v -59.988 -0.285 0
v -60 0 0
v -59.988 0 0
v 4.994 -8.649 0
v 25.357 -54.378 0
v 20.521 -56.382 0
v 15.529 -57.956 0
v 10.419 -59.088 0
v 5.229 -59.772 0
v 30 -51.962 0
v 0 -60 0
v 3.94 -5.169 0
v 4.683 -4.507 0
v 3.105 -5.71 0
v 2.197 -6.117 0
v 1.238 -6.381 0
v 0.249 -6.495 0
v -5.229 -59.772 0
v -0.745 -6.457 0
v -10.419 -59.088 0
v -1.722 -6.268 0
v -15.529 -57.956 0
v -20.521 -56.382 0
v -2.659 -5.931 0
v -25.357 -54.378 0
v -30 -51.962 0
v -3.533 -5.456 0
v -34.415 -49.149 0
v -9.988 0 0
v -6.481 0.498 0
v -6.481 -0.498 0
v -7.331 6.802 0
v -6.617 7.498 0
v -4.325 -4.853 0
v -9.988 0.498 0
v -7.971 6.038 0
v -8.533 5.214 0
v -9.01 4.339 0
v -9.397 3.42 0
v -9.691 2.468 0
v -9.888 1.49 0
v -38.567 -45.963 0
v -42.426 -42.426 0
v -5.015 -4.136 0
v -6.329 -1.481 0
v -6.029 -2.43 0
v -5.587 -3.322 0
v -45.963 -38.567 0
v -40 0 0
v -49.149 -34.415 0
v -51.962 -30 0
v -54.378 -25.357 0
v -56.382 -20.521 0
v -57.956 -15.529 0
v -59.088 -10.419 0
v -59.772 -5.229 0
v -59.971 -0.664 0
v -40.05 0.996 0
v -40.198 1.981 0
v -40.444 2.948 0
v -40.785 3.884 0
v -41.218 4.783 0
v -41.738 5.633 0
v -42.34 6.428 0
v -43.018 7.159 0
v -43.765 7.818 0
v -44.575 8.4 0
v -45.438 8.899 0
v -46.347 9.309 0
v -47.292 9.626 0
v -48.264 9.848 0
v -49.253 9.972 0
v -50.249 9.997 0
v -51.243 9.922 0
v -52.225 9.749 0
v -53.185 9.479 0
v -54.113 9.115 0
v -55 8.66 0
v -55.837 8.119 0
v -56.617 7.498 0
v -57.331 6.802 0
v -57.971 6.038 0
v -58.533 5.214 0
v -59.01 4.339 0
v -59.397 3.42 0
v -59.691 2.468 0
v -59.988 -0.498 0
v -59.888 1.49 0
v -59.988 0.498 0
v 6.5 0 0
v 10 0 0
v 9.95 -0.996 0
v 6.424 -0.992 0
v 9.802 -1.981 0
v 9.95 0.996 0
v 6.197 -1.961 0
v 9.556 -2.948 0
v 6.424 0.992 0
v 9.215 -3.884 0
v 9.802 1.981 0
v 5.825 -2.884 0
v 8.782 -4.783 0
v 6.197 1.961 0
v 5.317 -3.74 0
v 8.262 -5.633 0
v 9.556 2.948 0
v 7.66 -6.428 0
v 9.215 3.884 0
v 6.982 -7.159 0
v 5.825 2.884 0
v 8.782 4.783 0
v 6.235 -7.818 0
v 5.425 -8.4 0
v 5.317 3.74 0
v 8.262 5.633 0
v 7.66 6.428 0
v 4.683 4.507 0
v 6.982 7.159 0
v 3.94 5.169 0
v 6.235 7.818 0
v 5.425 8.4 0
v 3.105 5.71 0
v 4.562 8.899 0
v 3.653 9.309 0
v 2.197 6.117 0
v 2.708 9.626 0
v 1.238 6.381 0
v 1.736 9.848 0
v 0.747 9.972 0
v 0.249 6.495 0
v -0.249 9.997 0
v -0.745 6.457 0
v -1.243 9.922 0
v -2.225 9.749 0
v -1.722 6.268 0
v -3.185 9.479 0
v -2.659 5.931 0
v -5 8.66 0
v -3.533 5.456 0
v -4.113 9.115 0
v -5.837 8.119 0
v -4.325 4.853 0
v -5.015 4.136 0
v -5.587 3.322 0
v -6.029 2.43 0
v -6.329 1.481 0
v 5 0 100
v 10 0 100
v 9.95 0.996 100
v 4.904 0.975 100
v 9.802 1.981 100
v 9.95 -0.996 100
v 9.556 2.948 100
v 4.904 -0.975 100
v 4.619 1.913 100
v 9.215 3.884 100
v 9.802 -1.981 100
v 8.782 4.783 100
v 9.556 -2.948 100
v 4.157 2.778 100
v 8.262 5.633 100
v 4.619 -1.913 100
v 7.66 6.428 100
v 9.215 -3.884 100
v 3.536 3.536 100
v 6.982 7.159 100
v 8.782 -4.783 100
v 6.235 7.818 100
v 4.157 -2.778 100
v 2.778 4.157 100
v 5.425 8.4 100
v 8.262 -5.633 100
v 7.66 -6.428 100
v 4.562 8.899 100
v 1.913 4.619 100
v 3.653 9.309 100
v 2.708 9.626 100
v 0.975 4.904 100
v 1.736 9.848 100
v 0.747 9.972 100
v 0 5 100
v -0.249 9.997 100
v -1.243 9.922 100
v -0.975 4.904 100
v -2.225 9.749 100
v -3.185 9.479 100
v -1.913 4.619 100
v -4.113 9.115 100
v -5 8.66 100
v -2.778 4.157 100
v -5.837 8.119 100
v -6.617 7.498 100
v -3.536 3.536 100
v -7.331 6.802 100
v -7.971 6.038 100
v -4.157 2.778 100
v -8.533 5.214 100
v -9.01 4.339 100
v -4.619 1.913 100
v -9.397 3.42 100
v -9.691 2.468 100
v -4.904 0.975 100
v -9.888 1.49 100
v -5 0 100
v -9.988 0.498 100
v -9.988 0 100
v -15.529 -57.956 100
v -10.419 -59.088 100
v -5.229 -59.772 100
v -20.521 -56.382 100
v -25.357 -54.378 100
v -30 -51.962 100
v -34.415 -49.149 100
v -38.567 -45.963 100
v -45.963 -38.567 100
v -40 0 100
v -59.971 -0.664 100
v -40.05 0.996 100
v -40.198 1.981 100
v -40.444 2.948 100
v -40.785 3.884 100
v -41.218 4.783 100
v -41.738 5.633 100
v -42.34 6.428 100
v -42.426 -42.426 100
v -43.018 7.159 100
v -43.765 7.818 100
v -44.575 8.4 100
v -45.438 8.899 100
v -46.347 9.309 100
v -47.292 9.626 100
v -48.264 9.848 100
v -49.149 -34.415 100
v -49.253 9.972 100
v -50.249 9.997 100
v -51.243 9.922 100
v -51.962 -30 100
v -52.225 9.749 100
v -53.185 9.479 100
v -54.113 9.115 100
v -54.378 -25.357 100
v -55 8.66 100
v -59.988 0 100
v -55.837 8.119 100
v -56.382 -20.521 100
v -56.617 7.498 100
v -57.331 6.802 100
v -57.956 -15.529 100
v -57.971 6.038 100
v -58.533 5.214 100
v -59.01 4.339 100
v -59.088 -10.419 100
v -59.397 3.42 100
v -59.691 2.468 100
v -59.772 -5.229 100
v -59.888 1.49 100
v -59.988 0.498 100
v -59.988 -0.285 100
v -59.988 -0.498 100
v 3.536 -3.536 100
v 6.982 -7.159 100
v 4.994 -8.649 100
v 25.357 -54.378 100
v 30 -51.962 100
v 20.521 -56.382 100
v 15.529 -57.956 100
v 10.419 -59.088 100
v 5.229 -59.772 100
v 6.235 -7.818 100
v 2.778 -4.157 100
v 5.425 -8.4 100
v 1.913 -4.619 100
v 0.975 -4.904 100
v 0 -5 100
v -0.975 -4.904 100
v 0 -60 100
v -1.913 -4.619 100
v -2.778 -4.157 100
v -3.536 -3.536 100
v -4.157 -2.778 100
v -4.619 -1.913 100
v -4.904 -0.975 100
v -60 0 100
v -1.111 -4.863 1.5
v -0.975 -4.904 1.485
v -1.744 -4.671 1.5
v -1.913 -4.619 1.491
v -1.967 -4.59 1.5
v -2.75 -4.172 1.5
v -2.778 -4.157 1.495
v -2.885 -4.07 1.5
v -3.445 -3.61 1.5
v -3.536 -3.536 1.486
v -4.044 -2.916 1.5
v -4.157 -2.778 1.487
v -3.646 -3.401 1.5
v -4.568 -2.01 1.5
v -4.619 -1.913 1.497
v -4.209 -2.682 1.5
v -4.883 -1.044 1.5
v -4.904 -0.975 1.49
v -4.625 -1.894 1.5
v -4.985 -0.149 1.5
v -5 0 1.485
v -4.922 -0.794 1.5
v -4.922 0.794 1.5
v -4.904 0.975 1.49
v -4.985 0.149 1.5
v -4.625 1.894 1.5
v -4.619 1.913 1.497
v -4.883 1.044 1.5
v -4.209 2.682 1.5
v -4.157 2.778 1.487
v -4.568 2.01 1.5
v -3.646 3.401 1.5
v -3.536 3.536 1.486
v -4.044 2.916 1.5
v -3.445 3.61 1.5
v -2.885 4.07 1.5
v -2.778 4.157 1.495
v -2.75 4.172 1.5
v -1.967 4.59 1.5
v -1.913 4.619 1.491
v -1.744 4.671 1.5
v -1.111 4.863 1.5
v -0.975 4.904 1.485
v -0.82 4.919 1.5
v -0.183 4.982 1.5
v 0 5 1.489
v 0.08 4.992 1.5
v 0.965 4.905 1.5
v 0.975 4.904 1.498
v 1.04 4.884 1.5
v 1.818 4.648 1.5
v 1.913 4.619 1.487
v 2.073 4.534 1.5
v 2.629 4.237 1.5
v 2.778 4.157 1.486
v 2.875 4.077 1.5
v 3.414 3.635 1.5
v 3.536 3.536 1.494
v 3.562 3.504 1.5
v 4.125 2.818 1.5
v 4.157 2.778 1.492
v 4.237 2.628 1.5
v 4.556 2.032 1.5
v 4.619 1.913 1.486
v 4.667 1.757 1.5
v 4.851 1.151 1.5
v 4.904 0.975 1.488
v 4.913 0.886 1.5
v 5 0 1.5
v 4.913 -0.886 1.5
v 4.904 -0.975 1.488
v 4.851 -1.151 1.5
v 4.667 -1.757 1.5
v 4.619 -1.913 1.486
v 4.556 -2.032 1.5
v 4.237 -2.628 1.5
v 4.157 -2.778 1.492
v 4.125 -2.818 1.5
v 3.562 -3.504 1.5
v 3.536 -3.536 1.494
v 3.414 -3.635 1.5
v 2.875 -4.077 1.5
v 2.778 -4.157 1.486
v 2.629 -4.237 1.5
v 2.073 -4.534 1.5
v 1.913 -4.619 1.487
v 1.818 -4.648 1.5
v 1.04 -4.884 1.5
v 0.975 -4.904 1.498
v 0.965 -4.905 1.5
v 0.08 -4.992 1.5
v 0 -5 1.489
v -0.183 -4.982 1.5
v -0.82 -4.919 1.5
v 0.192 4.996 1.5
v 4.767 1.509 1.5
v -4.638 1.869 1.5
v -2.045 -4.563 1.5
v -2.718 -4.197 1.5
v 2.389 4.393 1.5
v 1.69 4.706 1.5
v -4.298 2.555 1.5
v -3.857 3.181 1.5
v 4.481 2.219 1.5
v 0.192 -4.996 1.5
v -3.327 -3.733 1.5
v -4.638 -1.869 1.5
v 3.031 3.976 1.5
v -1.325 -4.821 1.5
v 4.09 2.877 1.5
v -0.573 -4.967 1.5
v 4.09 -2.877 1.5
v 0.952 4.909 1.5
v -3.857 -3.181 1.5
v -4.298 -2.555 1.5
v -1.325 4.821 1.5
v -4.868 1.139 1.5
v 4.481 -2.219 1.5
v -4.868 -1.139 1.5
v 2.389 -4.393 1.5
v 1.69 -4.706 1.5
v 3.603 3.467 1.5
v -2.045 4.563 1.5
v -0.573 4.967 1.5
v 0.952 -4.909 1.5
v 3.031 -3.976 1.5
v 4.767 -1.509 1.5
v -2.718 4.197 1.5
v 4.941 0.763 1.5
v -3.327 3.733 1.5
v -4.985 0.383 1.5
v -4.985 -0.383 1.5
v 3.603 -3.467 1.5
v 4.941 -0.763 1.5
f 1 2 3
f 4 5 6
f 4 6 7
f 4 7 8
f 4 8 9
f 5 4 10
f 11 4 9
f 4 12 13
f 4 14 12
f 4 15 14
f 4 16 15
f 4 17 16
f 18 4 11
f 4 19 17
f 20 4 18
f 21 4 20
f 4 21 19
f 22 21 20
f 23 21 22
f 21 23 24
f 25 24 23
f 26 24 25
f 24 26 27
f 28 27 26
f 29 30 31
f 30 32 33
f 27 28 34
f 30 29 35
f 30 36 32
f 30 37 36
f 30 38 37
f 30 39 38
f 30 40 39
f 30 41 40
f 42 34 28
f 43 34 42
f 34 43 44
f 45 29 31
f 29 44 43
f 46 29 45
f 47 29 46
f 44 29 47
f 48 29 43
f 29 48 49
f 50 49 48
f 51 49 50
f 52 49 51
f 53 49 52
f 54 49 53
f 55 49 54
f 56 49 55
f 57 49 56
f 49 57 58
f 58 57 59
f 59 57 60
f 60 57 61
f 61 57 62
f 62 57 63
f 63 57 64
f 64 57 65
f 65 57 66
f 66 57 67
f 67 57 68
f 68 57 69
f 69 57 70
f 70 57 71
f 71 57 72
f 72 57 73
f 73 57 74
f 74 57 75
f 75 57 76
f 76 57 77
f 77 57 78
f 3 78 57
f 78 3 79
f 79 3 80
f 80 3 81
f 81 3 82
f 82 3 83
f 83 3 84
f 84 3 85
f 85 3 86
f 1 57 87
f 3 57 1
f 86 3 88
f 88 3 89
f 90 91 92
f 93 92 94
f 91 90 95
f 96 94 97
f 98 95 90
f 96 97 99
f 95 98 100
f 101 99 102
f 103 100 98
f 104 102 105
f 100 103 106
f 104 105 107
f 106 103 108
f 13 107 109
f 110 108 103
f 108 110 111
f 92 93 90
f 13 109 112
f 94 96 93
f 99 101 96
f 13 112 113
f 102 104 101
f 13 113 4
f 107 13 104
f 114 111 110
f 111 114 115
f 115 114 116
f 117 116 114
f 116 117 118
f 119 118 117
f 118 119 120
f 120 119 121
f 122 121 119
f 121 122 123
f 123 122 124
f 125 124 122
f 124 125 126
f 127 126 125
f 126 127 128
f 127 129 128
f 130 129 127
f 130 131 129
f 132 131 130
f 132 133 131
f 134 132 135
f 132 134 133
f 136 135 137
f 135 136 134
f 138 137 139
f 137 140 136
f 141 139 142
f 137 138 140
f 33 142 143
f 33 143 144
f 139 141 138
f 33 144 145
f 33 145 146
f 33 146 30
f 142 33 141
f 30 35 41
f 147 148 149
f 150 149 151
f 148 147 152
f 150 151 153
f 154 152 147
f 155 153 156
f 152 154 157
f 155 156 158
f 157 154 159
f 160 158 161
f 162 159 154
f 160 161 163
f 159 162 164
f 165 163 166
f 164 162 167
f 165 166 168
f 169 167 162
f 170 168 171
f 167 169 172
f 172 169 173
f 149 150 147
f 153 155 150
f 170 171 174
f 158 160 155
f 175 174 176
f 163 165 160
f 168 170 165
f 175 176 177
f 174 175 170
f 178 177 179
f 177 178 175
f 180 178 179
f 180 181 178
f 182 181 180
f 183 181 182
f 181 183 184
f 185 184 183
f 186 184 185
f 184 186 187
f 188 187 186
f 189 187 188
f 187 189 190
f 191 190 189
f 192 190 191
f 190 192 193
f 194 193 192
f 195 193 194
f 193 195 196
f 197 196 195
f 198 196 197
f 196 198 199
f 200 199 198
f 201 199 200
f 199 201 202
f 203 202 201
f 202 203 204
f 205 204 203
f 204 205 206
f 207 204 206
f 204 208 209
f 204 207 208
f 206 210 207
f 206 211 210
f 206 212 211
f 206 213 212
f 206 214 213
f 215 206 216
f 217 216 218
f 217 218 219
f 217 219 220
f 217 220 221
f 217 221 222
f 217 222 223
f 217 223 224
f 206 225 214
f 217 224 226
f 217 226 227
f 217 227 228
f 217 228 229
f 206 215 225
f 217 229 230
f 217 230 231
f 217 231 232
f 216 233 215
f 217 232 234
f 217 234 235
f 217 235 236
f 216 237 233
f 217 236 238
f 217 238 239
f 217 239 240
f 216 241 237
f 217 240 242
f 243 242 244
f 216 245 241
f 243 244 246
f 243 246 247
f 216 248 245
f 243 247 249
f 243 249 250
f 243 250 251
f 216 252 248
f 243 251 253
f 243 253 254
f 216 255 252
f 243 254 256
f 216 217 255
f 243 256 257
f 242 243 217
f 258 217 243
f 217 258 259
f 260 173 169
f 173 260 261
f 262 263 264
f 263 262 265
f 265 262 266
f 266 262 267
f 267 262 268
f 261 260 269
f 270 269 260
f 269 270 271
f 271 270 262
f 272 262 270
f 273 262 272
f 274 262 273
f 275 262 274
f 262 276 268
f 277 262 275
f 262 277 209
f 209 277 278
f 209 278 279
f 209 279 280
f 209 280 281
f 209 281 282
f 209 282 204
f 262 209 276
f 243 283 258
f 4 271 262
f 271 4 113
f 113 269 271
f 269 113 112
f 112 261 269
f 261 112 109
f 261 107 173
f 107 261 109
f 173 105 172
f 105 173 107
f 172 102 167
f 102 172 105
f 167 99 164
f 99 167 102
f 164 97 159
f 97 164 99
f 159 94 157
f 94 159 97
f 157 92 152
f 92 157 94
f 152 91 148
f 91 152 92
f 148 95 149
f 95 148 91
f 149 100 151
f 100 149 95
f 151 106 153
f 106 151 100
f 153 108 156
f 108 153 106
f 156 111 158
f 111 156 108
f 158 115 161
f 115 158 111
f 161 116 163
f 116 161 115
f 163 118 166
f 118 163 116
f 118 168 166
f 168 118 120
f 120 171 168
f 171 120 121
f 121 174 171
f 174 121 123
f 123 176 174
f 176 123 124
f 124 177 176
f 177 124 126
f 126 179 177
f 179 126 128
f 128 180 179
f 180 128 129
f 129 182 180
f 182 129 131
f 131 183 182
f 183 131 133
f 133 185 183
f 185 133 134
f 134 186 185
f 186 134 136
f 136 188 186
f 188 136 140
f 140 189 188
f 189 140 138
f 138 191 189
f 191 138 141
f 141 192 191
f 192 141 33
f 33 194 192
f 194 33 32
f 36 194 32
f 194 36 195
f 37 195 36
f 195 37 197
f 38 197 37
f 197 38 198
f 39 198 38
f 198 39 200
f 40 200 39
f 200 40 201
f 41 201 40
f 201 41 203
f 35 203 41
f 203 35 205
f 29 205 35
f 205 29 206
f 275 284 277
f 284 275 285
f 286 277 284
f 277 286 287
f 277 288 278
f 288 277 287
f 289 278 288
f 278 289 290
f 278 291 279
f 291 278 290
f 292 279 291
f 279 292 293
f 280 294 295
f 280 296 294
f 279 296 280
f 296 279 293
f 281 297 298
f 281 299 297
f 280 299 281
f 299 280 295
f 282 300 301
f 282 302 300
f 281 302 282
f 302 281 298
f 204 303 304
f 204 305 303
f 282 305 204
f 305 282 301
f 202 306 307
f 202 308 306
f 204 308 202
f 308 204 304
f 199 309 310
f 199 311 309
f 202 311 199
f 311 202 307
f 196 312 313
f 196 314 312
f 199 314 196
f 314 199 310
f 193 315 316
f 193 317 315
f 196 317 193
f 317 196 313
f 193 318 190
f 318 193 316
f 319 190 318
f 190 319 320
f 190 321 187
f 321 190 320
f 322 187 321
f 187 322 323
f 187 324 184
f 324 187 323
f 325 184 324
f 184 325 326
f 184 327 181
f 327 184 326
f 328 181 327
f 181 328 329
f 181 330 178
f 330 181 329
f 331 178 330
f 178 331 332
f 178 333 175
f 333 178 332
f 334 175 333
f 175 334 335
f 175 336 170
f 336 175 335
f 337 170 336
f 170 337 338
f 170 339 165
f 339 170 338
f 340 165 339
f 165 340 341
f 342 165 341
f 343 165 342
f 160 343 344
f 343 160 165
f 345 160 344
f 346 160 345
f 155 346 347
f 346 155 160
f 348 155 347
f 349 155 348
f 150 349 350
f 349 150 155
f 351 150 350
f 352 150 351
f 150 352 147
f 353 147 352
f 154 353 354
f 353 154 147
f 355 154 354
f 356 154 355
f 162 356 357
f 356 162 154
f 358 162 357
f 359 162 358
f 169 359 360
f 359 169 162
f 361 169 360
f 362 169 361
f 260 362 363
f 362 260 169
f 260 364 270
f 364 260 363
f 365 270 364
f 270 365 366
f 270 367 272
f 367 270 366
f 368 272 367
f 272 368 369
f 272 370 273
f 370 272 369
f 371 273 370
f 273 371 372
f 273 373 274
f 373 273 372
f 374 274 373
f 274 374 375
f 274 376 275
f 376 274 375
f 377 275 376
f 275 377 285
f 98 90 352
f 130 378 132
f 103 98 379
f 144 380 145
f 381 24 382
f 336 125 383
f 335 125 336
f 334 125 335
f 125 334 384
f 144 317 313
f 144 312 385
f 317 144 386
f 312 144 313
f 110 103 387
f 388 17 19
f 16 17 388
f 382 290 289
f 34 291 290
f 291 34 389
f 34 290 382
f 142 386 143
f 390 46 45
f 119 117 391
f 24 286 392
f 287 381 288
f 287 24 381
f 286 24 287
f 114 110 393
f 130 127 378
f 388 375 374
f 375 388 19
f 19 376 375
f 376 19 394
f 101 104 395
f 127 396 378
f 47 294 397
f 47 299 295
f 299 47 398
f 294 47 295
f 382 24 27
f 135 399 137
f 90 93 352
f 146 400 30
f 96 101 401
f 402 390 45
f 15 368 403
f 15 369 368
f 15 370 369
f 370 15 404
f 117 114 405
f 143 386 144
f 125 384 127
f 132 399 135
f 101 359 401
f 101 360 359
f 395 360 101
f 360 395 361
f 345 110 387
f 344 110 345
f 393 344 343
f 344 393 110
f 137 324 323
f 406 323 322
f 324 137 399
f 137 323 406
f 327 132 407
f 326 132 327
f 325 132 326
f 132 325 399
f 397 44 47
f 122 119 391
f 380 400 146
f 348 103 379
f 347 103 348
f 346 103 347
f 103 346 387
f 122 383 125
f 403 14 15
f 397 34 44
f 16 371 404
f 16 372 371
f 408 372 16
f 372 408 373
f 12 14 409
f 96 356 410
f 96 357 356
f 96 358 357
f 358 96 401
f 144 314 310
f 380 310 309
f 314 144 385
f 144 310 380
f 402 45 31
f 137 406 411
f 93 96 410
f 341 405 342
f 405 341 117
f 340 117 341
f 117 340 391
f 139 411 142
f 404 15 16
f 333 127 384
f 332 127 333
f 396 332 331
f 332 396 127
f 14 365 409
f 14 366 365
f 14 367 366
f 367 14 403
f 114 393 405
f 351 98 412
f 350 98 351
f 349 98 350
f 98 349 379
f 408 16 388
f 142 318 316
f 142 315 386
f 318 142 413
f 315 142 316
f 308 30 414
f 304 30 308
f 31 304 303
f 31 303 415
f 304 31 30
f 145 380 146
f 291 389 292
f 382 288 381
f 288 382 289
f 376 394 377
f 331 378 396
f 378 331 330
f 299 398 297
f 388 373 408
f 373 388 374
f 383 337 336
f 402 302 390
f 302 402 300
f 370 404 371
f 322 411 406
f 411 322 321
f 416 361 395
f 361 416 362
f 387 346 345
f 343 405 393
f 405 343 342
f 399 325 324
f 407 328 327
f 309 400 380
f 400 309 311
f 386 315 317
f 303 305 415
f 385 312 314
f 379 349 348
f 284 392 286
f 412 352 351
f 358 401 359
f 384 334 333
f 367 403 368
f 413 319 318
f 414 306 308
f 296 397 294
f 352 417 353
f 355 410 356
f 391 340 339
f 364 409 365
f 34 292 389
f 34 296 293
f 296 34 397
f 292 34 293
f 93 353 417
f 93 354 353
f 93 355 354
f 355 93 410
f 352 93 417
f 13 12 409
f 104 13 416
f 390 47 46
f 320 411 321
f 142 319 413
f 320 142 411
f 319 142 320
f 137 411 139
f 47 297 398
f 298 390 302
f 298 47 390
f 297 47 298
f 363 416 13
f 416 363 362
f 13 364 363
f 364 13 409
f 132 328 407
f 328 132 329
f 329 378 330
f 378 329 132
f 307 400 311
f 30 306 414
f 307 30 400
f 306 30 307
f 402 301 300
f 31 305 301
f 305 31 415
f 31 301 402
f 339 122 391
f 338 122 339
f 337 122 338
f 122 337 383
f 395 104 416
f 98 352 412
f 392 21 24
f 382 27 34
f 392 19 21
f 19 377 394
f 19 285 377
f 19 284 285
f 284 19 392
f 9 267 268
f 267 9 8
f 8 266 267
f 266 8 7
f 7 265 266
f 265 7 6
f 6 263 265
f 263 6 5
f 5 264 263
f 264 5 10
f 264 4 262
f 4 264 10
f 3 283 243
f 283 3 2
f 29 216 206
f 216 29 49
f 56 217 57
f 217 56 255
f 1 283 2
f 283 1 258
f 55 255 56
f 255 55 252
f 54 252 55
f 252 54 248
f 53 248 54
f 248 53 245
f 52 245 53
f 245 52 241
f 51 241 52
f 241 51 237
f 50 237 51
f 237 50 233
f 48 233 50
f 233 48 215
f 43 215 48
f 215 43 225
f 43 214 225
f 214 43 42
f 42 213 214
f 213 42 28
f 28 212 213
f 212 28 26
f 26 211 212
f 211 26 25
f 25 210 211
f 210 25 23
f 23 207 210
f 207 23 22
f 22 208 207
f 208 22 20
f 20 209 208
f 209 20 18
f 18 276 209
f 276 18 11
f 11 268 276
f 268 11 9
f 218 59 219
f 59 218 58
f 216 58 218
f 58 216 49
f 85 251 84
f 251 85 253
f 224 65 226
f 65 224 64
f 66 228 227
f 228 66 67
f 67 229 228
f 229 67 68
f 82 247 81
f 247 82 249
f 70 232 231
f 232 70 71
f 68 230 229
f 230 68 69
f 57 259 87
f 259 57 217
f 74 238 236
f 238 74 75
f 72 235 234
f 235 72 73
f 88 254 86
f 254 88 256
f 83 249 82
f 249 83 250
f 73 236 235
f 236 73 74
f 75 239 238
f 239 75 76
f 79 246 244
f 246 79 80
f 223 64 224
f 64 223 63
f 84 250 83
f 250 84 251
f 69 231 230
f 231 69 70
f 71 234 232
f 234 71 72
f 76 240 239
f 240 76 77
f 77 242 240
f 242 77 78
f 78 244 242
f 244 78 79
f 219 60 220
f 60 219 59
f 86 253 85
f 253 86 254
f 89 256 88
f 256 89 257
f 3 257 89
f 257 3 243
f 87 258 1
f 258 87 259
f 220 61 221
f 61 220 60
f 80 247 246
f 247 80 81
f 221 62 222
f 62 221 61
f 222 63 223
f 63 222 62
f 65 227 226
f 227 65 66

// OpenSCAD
// -*- mode: SCAD ; c-file-style: "ellemtel" ; coding: utf-8 -*-
//
// Radius gauge
//
// (c) 2015 Grant Stevens
// https://www.thingiverse.com/thing:910616
// (c) 2018 Roland Sieker <ospalh@gmail.com>
// Licence: CC-BY-SA 4.0
// Modification history:
// By Grant Stevens:
// 08/01/2015 Replace WriteScad with text(); thank you roki@thingiverse!
// 08/01/2015 Strengthen hinge.
// 05/27/2016 Add "inches" version.
// By ospalh:
// 6 July 2017: Drop inch version, use "Praxis font", put unit on there
// 3 June 2018: Use heavy font, my render/preview trick.

view = 1; // 0 = assembly view; 1 = arranged for printing
part = 1; // 1 = stationary part; 2 = moving part; 3 = both;
          // 4 = gauge w/ hole; 5 = gauge w/ pin; 6 = both gauges

preview = true; // Set this to false before you create the STL.
font_ = "Praxis LT:style=Heavy";  // Set this to a font you actually have.
// Look up which ones are available under OpenSCAD's Help/Font List menu.

// fn for differently sized objects and fs, fa; all for preview or rendering.
pna = 40;
pnb = 15;
pa = 5;
ps = 1;
rna = 180;
rnb = 30;
ra = 1;
rs = 0.1;
function na() = (preview) ? pna : rna;
function nb() = (preview) ? pnb : rnb;
$fs = (preview) ? ps : rs;
$fa = (preview) ? pa : ra;


// Constant
CM = 10; // Convert cm to mm

// Parameters
thickness = 3;
contact_radius = 10;
contact_spread = 50;
protractor_radius = contact_spread + contact_radius;
pointer_radius = protractor_radius - 12;
pointer_width = contact_radius / 2;
hinge_cylinder_dia = 10;
hinge_clearance = 0.2;
hinge_pin_dia = hinge_cylinder_dia - hinge_clearance;
hinge_pin_wall_thickness = 4.0;
hinge_pin_nub_dia = hinge_pin_dia + 0.7;
hinge_pin_spread_gap = thickness/4 * 1.8;
concave_tick_list = [9, 10, 12, 14, 16, 18, 20, 30, 40, 50, 100];

concave_number_list = [8, 10, 20, 50];

convex_tick_list = [6, 7, 8, 9, 10, 12, 14, 16, 18, 20, 30, 40, 50, 100];
convex_number_list = [5, 10, 20, 50];

text_extrude_hight = 0.9;
text_character_hight = 5.5;

if ( view == 0 ) // 0 = assembly view
{
   if ( part == 1 || part == 3 )
      stationary_part();

   if ( part == 2 || part == 3 )
      moving_part();

   if ( part == 4 || part == 6 )
      stationary_part_hinge();

   if ( part == 5 || part == 6 )
      moving_part_hinge();
}
else // view == 1 // 1 = arranged for printing
{
   if ( part == 1 || part == 3 )
      stationary_part();

   if ( part == 2 || part == 3 )
      translate([- contact_spread/2, contact_radius + 3, 2 * thickness])
         rotate([180, 0, 0])
         moving_part();

   if ( part == 4 || part == 6 )
      stationary_part_hinge();

   if ( part == 5 || part == 6 )
   {
      translate([2.1 * contact_radius, 0, 2 * thickness])
         rotate([180, 0, 0])
         moving_part_hinge();
   }
}



///////////////////////////////////////////////////////////////////////////////////

module stationary_part()
{
   stationary_part_hinge();

   // Protractor arc.
   linear_extrude(hight=thickness)
      difference()
   {
      // Protractor arc.
      difference()
      {
         circle(r=protractor_radius, center=true);
         translate([-999/2, 0]) square([999, 999]);
         rotate([0, 0, -60]) translate([-999/2, 0]) square([999, 999]);
      }

      // Don't let this part run into the hinge pin hole.
      circle(r=contact_radius * .9, center=true);
   }

   // Tall contact cylinder on stationary part.
   linear_extrude(hight=2 * thickness)
      translate([- contact_spread, 0])
      circle(r=contact_radius, center=true);

   translate([-contact_spread, 0, 2*thickness])
   {
      color("Black")
      {
         rotate(-70)
         {
            linear_extrude(text_extrude_hight)
            {
               text(
                  "cm", text_character_hight, font_,
                  halign="center",
                  valign="center");
            }
         }
      }
   }


   for ( measured_radius=convex_number_list )
      number_mark(
         str(abs(measured_radius)),
         angle_for_measured_convex_radius(measured_radius * CM));

   for ( measured_radius=concave_number_list )
      number_mark(
         str(abs(measured_radius)),
         - angle_for_measured_concave_radius(
            measured_radius * CM));

   for ( measured_radius=convex_tick_list )
      tick_mark(angle_for_measured_convex_radius(
                    measured_radius * CM));

   for ( measured_radius=concave_tick_list )
      tick_mark(- angle_for_measured_concave_radius(
                    measured_radius * CM));
}



module stationary_part_hinge()
{
   difference()
   {
      linear_extrude(hight=thickness)
         difference()
      {
         // Contact circle with hinge cylinder.
         circle(r=contact_radius, center=true);

         // Cut out hinge cylinder.
         circle(d=hinge_cylinder_dia, center=true);
      }

      // Cut out lock-bevel in hinge cylinder.
      cylinder(h=thickness/2,
                d1=hinge_cylinder_dia + thickness,
                d2=hinge_cylinder_dia);
   }
}



module number_mark(text, angle)
   color("Black")
{
   rotate(-30 + angle)
      translate([0, - protractor_radius + 1, thickness])
      linear_extrude(text_extrude_hight)
      text(text, text_character_hight, font_, halign="center");
   tick_mark(angle, 4);
}



module tick_mark(angle, length=2)
   color("Black")
{
   rotate(-30 + angle)
      translate([-1/2, -(length + pointer_radius + .5), thickness])
      cube([1, length, text_extrude_hight]);
}



module moving_part()
//   color("Cyan")
{
   translate([0, 0, thickness])
      linear_extrude(hight=thickness)
   {
      // Pointer
      rotate([0, 0, -30])
         difference()
      {
         translate([- pointer_width/2, - pointer_radius])
			square([pointer_width, pointer_radius]);

         translate([0, - pointer_radius])
			for ( a=[-45, 135] )
               rotate([0, 0, a])
                  translate([.01, .01]) // avoid rendering error
                  square([9, 9]);
      }

      // Triangular fill between pointer and moving contact.
      polygon(
         points = [
            [0, 0],
            [contact_spread + contact_radius, 0],
            [.8 * - pointer_radius * sin(30), .8 * - pointer_radius * cos(30)] ],
         paths = [ [0, 1, 2] ]);
   }

   // Tall contact cylinder on moving part.
   linear_extrude(hight=2 * thickness)
      translate([contact_spread, 0, 0])
      circle(r=contact_radius, center=true);

   // Hinge pin.
   moving_part_hinge();
}



module hinge_pin_solid()
{
   // Bottom half of hinge cylinder.
   translate([0, 0, thickness / 2])
      cylinder(h=thickness / 2, d=hinge_pin_dia);

   // Bulge in the middle, that must be pressed through the hole in the matching
   // part, and will then expand to hold the pieces together.
   intersection()
   {
      union()
      {
         cylinder(h=thickness/4,
                   d1=hinge_pin_dia               - 1.0,
                   d2=hinge_pin_dia + thickness/2 - 1.0);

         translate([0, 0, thickness/4])
			cylinder(h=thickness/4,
                      d1=hinge_pin_dia + thickness/2,
                      d2=hinge_pin_dia);
      }

      // Remove the too-wide portion of the bulge.
      cylinder(h=99, d=hinge_pin_nub_dia);
   }
}



module moving_part_hinge()
   //color("Cyan")
{
   // Contact circle with hinge pin.
   translate([0, 0, thickness])
      linear_extrude(hight=thickness)
      circle(r=contact_radius, center=true);

   // Hinge pin.
   difference()
   {
      hinge_pin_solid();

      scale([
                1 - hinge_pin_wall_thickness / hinge_pin_dia,
                1 - hinge_pin_wall_thickness / hinge_pin_dia,
                1])
      {
         hinge_pin_solid();
      }

      translate([- hinge_pin_spread_gap/2, -99/2, -99/2])
      {
         cube([hinge_pin_spread_gap, 99, 99]);
      }

      // Cut off the overhang on both ends.
      for ( m=[0, 1] )
      {
         mirror([0, m, 0])
         {
            translate([-9/2, hinge_pin_dia/2, -9/2])
            {
               cube([9, 9, 9]);
            }
         }
      }
   }
}



function angle_for_measured_concave_radius(measured_radius) = 2 * asin(contact_spread / 2 /(measured_radius - contact_radius));

function angle_for_measured_convex_radius(measured_radius) = 2 * asin(contact_spread / 2 /(measured_radius + contact_radius));
